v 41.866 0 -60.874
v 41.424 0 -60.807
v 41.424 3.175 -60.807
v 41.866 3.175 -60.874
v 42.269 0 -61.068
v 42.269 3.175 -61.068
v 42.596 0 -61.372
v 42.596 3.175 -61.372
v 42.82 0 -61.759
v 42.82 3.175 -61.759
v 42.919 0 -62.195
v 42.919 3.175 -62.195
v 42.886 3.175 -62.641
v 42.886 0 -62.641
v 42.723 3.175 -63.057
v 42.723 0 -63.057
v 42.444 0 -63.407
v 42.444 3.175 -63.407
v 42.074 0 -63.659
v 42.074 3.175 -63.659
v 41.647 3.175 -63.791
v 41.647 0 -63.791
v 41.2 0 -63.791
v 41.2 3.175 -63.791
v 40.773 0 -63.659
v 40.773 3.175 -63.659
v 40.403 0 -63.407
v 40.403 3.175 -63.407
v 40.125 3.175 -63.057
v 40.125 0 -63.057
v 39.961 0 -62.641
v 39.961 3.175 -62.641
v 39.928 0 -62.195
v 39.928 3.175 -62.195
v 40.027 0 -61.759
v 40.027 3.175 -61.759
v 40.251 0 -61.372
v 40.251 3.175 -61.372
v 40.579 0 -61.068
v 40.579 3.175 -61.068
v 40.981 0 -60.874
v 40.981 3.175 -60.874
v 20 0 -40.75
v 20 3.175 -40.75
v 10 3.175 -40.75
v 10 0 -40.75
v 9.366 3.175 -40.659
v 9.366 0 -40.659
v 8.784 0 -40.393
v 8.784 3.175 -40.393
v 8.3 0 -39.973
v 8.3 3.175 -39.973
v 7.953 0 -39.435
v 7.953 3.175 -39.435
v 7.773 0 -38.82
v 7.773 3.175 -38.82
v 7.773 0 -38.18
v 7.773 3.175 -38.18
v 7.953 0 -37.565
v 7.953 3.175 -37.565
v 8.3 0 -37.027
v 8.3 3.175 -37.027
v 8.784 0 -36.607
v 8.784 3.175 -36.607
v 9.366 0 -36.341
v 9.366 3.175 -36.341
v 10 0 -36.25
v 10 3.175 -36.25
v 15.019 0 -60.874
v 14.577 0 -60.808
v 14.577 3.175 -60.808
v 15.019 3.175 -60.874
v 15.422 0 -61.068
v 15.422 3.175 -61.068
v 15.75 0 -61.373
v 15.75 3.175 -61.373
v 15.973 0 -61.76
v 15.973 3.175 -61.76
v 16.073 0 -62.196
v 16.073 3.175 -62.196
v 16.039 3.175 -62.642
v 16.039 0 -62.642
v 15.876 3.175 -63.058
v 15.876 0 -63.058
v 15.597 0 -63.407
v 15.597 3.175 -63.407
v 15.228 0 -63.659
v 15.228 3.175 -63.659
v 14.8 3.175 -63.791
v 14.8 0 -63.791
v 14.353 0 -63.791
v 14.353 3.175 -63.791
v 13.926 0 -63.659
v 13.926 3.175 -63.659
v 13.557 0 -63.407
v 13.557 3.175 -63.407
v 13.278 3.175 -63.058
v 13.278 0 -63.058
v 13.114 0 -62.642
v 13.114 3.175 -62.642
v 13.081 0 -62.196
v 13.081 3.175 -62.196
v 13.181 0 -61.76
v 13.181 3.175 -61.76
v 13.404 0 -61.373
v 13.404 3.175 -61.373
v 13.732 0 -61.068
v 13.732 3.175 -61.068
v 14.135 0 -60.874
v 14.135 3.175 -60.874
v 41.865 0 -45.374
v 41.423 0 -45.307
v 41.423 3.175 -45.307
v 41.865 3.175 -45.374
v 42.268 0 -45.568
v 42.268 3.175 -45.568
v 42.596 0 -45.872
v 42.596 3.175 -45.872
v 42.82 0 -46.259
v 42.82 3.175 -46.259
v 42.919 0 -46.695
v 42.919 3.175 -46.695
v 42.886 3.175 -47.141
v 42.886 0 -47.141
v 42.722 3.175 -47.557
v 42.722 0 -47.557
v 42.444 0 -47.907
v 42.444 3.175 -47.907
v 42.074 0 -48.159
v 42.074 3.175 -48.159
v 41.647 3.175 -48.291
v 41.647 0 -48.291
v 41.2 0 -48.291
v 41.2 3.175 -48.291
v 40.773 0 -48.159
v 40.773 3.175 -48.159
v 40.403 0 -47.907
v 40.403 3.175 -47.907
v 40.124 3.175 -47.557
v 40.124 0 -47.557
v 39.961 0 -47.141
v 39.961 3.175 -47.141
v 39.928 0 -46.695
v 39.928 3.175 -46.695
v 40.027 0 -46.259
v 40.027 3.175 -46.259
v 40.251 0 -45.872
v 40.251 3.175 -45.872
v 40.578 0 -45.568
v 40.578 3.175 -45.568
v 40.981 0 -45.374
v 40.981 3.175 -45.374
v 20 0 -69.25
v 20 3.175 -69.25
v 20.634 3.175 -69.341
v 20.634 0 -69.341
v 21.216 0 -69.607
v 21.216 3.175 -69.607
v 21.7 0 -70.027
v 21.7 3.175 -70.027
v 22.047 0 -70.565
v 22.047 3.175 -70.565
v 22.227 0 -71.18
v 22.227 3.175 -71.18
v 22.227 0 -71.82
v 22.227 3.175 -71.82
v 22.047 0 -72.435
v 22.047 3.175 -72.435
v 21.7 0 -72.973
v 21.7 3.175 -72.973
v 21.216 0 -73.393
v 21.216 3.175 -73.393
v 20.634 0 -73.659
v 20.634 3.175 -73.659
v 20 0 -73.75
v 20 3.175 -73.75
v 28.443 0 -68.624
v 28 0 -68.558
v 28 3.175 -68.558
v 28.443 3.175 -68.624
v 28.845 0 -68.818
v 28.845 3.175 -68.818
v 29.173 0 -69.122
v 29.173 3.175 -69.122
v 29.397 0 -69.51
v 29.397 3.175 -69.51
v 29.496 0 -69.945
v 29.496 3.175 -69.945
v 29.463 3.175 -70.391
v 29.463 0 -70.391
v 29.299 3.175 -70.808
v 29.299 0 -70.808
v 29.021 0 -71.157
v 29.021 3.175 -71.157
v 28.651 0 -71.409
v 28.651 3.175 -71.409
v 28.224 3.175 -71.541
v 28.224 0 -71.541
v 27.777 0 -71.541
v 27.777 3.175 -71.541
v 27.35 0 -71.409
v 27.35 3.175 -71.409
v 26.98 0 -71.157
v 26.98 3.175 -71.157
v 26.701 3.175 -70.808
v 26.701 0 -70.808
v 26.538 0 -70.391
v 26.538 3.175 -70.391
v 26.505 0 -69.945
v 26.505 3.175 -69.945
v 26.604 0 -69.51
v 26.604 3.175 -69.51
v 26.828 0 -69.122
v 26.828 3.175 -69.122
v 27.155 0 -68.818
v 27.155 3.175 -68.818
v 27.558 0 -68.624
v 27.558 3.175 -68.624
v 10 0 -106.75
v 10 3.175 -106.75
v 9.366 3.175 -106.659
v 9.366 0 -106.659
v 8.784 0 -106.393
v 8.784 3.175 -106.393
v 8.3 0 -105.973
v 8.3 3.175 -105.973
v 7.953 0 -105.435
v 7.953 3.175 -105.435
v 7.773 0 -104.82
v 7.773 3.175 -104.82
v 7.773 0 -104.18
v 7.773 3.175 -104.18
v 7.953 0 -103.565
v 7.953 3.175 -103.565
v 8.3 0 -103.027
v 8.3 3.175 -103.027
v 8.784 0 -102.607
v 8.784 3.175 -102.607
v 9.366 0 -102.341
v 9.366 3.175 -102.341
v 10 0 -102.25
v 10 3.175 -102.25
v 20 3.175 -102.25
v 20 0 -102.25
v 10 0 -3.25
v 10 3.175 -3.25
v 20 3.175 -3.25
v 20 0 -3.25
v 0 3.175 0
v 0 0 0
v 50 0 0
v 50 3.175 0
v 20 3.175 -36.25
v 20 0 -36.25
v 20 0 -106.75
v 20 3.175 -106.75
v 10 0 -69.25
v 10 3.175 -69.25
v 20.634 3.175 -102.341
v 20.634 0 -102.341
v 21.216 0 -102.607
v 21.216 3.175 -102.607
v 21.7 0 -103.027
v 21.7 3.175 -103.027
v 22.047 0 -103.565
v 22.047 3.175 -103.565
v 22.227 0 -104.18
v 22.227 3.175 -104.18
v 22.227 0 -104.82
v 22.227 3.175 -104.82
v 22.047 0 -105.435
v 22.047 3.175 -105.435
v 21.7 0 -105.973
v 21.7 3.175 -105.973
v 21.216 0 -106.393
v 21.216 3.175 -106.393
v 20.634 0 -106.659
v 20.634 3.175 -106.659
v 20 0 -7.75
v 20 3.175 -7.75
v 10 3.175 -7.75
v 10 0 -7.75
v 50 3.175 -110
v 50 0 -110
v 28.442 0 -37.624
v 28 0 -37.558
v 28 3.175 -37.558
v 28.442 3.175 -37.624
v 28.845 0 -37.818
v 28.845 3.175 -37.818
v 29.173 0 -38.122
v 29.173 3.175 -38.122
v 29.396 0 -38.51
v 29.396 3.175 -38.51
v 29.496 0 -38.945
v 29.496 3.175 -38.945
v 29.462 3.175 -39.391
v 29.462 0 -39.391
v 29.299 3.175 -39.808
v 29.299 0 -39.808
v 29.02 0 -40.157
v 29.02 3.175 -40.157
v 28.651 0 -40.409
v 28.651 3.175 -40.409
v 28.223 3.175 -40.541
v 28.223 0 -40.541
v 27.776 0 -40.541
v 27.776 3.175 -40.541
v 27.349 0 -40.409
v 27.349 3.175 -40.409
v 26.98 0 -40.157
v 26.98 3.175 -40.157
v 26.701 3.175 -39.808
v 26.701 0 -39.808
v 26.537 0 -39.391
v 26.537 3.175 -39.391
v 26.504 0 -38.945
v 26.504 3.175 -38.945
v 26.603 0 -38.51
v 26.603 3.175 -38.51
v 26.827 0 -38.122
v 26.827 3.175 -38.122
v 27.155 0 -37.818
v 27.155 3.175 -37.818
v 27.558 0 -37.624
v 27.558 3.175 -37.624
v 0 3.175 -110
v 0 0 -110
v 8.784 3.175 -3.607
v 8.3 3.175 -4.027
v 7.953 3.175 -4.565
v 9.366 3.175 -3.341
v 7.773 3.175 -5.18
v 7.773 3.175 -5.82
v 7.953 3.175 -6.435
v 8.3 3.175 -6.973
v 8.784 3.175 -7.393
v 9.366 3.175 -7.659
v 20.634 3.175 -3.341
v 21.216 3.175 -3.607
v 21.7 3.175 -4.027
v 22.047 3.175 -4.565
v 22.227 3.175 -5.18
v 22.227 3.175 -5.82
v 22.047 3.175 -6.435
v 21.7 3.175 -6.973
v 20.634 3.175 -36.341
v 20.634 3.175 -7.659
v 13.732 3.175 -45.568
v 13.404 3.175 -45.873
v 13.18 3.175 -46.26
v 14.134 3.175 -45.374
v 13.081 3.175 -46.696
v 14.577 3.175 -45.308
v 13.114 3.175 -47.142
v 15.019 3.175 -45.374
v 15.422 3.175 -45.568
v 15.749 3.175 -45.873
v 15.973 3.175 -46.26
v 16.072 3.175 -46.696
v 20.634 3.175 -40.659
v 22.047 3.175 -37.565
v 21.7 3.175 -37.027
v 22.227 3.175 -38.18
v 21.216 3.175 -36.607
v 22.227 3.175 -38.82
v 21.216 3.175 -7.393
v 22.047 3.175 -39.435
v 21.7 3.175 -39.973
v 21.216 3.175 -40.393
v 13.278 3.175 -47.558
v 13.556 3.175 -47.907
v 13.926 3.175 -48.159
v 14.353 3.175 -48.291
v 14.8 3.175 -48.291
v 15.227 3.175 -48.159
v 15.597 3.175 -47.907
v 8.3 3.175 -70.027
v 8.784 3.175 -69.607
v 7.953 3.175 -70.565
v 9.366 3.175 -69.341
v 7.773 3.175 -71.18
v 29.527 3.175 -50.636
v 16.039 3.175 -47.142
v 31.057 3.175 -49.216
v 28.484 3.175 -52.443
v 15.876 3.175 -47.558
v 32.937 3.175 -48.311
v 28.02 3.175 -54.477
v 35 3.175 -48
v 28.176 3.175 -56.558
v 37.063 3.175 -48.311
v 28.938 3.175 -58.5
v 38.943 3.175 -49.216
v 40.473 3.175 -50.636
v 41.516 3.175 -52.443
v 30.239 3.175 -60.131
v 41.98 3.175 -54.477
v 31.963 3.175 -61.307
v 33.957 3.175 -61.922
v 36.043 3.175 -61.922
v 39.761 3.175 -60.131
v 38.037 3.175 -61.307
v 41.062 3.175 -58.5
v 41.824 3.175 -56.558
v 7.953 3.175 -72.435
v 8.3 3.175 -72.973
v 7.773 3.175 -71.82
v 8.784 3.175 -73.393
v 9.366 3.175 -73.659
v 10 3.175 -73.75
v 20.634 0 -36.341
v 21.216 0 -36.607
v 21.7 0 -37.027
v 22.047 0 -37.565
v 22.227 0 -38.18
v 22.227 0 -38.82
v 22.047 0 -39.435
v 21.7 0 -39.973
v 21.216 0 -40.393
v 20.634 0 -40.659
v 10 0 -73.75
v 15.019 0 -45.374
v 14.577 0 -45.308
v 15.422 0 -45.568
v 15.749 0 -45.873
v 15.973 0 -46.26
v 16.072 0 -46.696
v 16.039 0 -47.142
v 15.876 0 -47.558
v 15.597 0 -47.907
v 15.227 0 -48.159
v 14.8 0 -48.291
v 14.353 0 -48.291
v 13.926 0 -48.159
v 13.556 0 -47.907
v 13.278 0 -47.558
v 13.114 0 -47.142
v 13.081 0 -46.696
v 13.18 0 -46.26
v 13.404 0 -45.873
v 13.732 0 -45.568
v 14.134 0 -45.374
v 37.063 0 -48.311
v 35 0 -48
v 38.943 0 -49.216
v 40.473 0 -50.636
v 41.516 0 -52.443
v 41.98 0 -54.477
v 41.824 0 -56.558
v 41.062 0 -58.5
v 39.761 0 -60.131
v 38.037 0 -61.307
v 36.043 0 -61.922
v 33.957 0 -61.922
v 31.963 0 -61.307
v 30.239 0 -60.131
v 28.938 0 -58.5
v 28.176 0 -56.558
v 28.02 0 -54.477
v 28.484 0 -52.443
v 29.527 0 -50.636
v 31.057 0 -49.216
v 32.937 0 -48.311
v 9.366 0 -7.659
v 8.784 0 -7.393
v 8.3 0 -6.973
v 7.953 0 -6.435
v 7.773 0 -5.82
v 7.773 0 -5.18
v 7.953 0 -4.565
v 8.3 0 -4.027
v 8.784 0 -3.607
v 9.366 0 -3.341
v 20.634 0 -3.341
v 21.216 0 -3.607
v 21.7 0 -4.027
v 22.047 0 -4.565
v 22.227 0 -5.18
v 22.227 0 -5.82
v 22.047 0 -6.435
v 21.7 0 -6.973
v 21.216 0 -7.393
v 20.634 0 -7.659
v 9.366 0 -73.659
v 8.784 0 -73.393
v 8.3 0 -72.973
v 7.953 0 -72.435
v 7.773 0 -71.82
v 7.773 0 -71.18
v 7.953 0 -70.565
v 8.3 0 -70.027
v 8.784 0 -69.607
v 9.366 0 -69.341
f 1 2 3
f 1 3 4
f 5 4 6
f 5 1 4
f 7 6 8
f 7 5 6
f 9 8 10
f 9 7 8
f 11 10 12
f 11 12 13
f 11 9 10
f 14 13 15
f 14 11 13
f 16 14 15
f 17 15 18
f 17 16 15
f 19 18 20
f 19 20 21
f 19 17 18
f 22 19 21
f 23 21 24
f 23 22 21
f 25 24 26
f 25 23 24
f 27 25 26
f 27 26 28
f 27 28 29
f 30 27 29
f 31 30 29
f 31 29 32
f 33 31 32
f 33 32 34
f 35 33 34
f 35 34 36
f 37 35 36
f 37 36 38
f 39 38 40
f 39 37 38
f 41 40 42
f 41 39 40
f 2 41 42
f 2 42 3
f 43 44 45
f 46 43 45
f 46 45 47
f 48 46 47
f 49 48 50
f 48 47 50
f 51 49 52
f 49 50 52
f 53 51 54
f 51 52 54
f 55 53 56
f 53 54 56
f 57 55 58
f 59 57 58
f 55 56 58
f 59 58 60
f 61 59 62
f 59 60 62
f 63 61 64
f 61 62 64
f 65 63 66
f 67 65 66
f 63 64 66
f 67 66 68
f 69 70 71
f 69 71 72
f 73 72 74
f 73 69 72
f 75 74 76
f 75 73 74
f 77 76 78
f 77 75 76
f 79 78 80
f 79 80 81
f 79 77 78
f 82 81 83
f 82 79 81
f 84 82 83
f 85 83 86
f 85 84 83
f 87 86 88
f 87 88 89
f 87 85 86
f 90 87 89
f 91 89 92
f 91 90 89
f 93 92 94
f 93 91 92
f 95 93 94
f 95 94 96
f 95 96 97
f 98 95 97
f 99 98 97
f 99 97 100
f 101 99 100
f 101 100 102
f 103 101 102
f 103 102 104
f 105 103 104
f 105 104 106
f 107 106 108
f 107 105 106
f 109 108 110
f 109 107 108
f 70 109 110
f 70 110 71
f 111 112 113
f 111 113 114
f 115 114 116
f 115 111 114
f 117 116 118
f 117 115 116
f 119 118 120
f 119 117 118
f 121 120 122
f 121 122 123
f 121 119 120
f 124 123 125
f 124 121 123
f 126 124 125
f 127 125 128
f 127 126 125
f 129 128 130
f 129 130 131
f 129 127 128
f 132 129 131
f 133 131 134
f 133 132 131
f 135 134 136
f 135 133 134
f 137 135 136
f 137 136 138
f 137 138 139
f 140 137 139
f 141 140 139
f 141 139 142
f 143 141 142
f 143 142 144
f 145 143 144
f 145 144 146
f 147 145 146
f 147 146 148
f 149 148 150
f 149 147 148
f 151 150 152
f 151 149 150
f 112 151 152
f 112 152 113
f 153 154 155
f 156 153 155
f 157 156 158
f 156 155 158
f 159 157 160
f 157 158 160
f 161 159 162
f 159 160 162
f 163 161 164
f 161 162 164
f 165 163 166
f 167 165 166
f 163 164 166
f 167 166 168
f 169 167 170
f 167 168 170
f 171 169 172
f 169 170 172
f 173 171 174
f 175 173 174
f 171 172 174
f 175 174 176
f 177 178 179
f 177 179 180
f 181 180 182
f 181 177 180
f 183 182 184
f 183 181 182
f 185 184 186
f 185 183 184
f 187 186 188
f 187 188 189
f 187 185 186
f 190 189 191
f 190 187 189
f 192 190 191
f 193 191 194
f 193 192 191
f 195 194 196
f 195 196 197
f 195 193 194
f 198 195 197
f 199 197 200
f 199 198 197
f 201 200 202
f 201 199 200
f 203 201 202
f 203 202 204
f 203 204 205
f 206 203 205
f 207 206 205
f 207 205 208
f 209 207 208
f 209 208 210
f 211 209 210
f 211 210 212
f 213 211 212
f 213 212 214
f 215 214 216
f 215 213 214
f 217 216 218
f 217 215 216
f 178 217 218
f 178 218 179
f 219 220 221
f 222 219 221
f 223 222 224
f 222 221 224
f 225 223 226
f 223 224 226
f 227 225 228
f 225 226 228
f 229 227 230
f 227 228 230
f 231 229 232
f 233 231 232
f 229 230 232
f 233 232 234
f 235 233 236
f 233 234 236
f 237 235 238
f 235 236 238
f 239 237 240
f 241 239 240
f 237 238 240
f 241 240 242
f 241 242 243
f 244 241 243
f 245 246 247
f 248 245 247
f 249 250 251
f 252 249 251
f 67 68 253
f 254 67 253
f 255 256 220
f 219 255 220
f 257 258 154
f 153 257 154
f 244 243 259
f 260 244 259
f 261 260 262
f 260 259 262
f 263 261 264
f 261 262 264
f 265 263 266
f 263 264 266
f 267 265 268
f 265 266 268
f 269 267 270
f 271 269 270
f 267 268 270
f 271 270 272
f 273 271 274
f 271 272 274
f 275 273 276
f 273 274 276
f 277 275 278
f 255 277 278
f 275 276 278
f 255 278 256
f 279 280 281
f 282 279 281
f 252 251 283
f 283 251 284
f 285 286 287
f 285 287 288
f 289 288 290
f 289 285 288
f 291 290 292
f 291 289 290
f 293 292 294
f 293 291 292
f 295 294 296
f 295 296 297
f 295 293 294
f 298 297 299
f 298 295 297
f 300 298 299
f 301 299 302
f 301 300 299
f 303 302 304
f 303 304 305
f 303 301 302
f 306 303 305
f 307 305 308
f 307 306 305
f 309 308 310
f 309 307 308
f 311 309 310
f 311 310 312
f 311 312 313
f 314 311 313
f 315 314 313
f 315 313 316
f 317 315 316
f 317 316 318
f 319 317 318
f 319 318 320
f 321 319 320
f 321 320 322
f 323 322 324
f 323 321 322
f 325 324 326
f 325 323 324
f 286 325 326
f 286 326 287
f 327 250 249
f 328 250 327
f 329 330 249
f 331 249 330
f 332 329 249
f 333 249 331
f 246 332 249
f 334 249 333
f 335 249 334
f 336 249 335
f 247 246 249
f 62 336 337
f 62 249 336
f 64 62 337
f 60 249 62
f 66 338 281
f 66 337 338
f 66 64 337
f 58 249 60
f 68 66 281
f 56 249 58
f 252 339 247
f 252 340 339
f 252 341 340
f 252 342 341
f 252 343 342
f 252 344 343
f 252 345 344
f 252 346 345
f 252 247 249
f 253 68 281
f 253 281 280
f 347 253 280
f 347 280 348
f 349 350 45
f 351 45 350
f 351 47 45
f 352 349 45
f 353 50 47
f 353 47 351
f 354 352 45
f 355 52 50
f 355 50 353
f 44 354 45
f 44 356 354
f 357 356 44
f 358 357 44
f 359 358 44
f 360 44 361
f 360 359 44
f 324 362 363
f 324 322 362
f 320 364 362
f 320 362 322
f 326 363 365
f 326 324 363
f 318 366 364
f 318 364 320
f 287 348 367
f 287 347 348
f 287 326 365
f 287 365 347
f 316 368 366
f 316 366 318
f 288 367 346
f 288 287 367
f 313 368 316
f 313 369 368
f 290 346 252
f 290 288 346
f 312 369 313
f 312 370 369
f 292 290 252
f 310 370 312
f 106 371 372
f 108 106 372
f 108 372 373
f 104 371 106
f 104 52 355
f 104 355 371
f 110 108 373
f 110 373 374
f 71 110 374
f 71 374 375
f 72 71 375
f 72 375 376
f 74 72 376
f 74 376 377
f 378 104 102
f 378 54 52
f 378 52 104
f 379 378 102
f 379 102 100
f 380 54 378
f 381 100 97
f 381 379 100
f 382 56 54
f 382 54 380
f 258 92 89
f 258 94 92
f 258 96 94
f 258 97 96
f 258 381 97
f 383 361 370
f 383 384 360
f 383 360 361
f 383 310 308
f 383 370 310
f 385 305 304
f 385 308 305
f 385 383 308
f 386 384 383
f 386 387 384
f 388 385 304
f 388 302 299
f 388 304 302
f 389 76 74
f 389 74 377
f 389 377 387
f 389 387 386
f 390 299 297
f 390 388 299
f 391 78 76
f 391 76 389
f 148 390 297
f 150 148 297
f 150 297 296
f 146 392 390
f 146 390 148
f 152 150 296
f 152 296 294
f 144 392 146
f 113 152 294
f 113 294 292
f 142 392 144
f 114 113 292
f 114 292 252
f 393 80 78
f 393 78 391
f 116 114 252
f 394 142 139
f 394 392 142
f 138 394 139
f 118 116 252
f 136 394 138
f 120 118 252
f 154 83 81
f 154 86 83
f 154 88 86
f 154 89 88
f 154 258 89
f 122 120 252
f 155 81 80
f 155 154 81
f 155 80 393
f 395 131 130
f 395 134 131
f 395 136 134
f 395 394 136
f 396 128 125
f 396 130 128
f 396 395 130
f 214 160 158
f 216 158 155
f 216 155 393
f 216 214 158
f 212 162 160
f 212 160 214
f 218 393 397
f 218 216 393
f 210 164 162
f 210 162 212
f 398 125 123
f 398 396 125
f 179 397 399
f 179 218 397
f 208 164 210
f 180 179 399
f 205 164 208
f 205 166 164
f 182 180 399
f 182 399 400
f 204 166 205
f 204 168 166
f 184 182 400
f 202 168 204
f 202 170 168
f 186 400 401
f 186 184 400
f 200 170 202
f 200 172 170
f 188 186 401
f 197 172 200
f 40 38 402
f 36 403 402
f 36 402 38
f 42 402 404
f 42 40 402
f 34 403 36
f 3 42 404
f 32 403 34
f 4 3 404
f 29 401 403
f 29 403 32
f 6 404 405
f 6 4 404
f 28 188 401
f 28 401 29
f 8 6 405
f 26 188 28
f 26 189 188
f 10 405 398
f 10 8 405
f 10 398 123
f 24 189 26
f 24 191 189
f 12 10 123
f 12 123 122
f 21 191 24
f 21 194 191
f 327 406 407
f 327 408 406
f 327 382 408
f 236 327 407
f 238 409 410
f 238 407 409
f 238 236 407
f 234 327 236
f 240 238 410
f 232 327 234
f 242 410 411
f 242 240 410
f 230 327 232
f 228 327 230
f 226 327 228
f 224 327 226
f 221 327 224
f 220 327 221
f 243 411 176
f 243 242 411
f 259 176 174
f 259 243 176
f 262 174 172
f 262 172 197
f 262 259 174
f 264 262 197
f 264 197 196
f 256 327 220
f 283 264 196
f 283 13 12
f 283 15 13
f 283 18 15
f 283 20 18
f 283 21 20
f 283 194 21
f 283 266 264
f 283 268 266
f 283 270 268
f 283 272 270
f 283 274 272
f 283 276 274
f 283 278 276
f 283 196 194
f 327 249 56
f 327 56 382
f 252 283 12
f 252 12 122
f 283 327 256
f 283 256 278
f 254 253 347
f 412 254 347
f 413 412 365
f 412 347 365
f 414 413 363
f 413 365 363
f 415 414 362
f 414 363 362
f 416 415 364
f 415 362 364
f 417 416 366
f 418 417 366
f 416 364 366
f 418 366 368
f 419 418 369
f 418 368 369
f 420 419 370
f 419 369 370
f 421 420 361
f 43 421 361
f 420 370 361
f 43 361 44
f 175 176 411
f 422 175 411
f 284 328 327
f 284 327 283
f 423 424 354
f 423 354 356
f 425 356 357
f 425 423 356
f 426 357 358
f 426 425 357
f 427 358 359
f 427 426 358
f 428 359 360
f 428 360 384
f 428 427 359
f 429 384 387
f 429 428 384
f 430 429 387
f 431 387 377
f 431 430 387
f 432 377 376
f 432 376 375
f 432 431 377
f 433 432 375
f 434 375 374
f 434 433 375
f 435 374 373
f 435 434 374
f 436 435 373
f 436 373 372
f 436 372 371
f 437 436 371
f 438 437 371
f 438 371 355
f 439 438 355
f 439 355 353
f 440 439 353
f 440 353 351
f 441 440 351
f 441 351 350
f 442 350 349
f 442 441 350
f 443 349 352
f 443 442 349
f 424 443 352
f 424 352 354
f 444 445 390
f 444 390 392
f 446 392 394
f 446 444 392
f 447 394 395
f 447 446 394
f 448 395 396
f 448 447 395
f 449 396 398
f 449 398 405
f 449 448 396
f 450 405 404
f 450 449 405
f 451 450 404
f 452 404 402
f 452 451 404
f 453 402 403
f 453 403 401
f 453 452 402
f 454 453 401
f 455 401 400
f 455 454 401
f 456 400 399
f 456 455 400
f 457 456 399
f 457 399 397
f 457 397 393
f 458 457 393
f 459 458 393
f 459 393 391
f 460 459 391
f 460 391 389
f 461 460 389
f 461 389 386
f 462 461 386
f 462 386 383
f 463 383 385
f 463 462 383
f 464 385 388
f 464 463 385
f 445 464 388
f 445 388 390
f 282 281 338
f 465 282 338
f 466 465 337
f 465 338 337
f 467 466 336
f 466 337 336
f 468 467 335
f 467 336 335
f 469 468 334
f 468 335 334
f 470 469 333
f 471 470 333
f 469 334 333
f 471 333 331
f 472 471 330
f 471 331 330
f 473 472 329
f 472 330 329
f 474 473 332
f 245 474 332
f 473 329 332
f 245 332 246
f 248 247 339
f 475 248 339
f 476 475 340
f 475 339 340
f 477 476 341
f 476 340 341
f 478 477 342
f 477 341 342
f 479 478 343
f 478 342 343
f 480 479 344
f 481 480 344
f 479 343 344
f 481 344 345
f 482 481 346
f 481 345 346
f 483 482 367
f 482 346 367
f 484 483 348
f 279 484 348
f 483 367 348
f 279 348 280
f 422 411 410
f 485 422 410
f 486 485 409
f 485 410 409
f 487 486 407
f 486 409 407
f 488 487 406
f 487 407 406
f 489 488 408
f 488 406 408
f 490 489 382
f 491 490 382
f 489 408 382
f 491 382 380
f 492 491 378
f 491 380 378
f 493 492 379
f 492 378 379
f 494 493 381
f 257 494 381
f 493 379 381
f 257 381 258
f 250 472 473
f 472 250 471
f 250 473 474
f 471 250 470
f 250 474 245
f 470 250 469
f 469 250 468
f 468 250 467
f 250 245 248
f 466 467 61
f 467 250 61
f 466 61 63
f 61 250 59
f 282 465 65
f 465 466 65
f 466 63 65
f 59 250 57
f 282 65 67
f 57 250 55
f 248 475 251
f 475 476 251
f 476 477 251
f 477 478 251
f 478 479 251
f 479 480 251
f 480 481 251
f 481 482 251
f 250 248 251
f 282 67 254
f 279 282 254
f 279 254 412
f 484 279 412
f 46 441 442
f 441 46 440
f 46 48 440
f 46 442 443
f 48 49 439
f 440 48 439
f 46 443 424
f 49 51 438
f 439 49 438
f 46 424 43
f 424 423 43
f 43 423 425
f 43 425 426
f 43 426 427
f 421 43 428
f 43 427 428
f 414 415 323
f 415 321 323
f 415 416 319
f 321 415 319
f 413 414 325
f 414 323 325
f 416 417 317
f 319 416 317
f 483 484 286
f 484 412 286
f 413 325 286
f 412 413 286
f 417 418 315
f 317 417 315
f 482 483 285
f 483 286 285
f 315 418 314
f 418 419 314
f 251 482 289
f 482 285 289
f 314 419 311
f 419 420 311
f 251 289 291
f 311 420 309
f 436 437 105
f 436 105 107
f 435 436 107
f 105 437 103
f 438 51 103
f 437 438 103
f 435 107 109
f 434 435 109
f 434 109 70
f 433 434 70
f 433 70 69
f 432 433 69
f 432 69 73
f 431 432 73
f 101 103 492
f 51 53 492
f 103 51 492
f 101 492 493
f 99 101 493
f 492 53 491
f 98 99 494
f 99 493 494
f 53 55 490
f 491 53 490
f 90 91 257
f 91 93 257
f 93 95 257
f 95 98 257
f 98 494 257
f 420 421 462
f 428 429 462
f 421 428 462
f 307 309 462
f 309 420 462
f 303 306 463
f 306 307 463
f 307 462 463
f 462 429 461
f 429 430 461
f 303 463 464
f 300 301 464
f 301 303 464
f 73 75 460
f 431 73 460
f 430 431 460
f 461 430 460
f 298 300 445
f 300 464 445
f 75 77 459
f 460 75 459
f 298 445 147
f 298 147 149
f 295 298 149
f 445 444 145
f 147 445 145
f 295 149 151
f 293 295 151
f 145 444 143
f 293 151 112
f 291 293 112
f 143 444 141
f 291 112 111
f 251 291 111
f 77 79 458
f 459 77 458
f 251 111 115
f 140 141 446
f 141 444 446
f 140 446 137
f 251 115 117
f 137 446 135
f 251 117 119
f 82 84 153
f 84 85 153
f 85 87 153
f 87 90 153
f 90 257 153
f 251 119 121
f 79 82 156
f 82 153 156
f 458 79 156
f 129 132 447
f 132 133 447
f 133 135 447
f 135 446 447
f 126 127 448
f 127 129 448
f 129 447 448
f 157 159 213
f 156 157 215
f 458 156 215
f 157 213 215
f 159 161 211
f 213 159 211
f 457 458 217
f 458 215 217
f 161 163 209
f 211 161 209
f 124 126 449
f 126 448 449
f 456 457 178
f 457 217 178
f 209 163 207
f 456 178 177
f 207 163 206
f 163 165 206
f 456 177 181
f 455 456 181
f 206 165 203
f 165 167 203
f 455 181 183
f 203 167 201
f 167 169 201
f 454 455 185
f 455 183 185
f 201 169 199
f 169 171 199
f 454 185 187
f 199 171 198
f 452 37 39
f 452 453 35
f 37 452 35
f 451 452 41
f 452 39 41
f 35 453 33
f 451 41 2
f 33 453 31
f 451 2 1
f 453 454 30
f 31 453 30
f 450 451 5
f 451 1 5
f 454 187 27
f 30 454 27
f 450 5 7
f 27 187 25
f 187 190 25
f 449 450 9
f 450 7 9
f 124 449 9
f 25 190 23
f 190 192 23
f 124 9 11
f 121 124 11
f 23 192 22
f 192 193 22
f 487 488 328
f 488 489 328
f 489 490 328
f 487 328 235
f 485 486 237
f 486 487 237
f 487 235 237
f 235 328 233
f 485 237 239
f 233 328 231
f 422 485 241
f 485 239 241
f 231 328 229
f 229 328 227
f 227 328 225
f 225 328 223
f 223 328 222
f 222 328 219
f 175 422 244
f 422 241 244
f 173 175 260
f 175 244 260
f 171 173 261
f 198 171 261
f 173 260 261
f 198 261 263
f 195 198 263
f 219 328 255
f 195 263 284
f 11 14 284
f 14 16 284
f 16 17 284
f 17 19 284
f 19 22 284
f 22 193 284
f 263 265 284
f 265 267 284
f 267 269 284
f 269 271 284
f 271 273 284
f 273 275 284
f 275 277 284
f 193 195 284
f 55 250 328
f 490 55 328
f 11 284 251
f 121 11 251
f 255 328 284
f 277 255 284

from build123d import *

# Parameters (mm, degrees)
SKETCH1_W           = 50
SKETCH1_H           = 110
SKETCH1_R           = 7
SKETCH1_R_2         = 1.5
BOSS_EXTRUDE1_DEPTH = 3.175
CUT_EXTRUDE1_DEPTH  = 10


with BuildPart() as part:
    # Sketch1 → Boss-Extrude1 (new body)
    with BuildSketch(Plane(origin=(0, 0, 0), x_dir=(1, 0, 0), z_dir=(0, 1, 0))):
        with Locations((25, 55)):
            Rectangle(SKETCH1_W, SKETCH1_H)
        with Locations(Location((35, 55, 0), (0, 0, 270))):
            Circle(SKETCH1_R, mode=Mode.SUBTRACT)
        with Locations(Location((41.423632142, 62.307271214, 0), (0, 0, 270))):
            Circle(SKETCH1_R_2, mode=Mode.SUBTRACT)
        with Locations(Location((41.423331921, 46.807271217, 0), (0, 0, 270))):
            Circle(SKETCH1_R_2, mode=Mode.SUBTRACT)
        with Locations(Location((27.999788054, 39.057531217, 0), (0, 0, 270))):
            Circle(SKETCH1_R_2, mode=Mode.SUBTRACT)
        with Locations(Location((14.576544409, 46.807791215, 0), (0, 0, 270))):
            Circle(SKETCH1_R_2, mode=Mode.SUBTRACT)
        with Locations(Location((14.57684463, 62.307791212, 0), (0, 0, 270))):
            Circle(SKETCH1_R_2, mode=Mode.SUBTRACT)
        with Locations(Location((28.000388497, 70.057531211, 0), (0, 0, 270))):
            Circle(SKETCH1_R_2, mode=Mode.SUBTRACT)
    extrude(amount=BOSS_EXTRUDE1_DEPTH)

    # Sketch2 → Cut-Extrude1 (cut)
    with BuildSketch(Plane(origin=(0, 3.175, 0), x_dir=(1, 0, 0), z_dir=(0, 1, 0))):
        with BuildLine():
            Line((10, 3.25), (20, 3.25))
            ThreePointArc((20, 3.25), (22.25, 5.5), (20, 7.75))
            Line((20, 7.75), (10, 7.75))
            ThreePointArc((10, 7.75), (7.75, 5.5), (10, 3.25))
        make_face()
        with BuildLine():
            Line((10, 36.25), (20, 36.25))
            ThreePointArc((20, 36.25), (22.25, 38.5), (20, 40.75))
            Line((20, 40.75), (10, 40.75))
            ThreePointArc((10, 40.75), (7.75, 38.5), (10, 36.25))
        make_face()
        with BuildLine():
            Line((10, 69.25), (20, 69.25))
            ThreePointArc((20, 69.25), (22.25, 71.5), (20, 73.75))
            Line((20, 73.75), (10, 73.75))
            ThreePointArc((10, 73.75), (7.75, 71.5), (10, 69.25))
        make_face()
        with BuildLine():
            Line((10, 102.25), (20, 102.25))
            ThreePointArc((20, 102.25), (22.25, 104.5), (20, 106.75))
            Line((20, 106.75), (10, 106.75))
            ThreePointArc((10, 106.75), (7.75, 104.5), (10, 102.25))
        make_face()
    extrude(amount=-CUT_EXTRUDE1_DEPTH, mode=Mode.SUBTRACT)


solid = part.part
